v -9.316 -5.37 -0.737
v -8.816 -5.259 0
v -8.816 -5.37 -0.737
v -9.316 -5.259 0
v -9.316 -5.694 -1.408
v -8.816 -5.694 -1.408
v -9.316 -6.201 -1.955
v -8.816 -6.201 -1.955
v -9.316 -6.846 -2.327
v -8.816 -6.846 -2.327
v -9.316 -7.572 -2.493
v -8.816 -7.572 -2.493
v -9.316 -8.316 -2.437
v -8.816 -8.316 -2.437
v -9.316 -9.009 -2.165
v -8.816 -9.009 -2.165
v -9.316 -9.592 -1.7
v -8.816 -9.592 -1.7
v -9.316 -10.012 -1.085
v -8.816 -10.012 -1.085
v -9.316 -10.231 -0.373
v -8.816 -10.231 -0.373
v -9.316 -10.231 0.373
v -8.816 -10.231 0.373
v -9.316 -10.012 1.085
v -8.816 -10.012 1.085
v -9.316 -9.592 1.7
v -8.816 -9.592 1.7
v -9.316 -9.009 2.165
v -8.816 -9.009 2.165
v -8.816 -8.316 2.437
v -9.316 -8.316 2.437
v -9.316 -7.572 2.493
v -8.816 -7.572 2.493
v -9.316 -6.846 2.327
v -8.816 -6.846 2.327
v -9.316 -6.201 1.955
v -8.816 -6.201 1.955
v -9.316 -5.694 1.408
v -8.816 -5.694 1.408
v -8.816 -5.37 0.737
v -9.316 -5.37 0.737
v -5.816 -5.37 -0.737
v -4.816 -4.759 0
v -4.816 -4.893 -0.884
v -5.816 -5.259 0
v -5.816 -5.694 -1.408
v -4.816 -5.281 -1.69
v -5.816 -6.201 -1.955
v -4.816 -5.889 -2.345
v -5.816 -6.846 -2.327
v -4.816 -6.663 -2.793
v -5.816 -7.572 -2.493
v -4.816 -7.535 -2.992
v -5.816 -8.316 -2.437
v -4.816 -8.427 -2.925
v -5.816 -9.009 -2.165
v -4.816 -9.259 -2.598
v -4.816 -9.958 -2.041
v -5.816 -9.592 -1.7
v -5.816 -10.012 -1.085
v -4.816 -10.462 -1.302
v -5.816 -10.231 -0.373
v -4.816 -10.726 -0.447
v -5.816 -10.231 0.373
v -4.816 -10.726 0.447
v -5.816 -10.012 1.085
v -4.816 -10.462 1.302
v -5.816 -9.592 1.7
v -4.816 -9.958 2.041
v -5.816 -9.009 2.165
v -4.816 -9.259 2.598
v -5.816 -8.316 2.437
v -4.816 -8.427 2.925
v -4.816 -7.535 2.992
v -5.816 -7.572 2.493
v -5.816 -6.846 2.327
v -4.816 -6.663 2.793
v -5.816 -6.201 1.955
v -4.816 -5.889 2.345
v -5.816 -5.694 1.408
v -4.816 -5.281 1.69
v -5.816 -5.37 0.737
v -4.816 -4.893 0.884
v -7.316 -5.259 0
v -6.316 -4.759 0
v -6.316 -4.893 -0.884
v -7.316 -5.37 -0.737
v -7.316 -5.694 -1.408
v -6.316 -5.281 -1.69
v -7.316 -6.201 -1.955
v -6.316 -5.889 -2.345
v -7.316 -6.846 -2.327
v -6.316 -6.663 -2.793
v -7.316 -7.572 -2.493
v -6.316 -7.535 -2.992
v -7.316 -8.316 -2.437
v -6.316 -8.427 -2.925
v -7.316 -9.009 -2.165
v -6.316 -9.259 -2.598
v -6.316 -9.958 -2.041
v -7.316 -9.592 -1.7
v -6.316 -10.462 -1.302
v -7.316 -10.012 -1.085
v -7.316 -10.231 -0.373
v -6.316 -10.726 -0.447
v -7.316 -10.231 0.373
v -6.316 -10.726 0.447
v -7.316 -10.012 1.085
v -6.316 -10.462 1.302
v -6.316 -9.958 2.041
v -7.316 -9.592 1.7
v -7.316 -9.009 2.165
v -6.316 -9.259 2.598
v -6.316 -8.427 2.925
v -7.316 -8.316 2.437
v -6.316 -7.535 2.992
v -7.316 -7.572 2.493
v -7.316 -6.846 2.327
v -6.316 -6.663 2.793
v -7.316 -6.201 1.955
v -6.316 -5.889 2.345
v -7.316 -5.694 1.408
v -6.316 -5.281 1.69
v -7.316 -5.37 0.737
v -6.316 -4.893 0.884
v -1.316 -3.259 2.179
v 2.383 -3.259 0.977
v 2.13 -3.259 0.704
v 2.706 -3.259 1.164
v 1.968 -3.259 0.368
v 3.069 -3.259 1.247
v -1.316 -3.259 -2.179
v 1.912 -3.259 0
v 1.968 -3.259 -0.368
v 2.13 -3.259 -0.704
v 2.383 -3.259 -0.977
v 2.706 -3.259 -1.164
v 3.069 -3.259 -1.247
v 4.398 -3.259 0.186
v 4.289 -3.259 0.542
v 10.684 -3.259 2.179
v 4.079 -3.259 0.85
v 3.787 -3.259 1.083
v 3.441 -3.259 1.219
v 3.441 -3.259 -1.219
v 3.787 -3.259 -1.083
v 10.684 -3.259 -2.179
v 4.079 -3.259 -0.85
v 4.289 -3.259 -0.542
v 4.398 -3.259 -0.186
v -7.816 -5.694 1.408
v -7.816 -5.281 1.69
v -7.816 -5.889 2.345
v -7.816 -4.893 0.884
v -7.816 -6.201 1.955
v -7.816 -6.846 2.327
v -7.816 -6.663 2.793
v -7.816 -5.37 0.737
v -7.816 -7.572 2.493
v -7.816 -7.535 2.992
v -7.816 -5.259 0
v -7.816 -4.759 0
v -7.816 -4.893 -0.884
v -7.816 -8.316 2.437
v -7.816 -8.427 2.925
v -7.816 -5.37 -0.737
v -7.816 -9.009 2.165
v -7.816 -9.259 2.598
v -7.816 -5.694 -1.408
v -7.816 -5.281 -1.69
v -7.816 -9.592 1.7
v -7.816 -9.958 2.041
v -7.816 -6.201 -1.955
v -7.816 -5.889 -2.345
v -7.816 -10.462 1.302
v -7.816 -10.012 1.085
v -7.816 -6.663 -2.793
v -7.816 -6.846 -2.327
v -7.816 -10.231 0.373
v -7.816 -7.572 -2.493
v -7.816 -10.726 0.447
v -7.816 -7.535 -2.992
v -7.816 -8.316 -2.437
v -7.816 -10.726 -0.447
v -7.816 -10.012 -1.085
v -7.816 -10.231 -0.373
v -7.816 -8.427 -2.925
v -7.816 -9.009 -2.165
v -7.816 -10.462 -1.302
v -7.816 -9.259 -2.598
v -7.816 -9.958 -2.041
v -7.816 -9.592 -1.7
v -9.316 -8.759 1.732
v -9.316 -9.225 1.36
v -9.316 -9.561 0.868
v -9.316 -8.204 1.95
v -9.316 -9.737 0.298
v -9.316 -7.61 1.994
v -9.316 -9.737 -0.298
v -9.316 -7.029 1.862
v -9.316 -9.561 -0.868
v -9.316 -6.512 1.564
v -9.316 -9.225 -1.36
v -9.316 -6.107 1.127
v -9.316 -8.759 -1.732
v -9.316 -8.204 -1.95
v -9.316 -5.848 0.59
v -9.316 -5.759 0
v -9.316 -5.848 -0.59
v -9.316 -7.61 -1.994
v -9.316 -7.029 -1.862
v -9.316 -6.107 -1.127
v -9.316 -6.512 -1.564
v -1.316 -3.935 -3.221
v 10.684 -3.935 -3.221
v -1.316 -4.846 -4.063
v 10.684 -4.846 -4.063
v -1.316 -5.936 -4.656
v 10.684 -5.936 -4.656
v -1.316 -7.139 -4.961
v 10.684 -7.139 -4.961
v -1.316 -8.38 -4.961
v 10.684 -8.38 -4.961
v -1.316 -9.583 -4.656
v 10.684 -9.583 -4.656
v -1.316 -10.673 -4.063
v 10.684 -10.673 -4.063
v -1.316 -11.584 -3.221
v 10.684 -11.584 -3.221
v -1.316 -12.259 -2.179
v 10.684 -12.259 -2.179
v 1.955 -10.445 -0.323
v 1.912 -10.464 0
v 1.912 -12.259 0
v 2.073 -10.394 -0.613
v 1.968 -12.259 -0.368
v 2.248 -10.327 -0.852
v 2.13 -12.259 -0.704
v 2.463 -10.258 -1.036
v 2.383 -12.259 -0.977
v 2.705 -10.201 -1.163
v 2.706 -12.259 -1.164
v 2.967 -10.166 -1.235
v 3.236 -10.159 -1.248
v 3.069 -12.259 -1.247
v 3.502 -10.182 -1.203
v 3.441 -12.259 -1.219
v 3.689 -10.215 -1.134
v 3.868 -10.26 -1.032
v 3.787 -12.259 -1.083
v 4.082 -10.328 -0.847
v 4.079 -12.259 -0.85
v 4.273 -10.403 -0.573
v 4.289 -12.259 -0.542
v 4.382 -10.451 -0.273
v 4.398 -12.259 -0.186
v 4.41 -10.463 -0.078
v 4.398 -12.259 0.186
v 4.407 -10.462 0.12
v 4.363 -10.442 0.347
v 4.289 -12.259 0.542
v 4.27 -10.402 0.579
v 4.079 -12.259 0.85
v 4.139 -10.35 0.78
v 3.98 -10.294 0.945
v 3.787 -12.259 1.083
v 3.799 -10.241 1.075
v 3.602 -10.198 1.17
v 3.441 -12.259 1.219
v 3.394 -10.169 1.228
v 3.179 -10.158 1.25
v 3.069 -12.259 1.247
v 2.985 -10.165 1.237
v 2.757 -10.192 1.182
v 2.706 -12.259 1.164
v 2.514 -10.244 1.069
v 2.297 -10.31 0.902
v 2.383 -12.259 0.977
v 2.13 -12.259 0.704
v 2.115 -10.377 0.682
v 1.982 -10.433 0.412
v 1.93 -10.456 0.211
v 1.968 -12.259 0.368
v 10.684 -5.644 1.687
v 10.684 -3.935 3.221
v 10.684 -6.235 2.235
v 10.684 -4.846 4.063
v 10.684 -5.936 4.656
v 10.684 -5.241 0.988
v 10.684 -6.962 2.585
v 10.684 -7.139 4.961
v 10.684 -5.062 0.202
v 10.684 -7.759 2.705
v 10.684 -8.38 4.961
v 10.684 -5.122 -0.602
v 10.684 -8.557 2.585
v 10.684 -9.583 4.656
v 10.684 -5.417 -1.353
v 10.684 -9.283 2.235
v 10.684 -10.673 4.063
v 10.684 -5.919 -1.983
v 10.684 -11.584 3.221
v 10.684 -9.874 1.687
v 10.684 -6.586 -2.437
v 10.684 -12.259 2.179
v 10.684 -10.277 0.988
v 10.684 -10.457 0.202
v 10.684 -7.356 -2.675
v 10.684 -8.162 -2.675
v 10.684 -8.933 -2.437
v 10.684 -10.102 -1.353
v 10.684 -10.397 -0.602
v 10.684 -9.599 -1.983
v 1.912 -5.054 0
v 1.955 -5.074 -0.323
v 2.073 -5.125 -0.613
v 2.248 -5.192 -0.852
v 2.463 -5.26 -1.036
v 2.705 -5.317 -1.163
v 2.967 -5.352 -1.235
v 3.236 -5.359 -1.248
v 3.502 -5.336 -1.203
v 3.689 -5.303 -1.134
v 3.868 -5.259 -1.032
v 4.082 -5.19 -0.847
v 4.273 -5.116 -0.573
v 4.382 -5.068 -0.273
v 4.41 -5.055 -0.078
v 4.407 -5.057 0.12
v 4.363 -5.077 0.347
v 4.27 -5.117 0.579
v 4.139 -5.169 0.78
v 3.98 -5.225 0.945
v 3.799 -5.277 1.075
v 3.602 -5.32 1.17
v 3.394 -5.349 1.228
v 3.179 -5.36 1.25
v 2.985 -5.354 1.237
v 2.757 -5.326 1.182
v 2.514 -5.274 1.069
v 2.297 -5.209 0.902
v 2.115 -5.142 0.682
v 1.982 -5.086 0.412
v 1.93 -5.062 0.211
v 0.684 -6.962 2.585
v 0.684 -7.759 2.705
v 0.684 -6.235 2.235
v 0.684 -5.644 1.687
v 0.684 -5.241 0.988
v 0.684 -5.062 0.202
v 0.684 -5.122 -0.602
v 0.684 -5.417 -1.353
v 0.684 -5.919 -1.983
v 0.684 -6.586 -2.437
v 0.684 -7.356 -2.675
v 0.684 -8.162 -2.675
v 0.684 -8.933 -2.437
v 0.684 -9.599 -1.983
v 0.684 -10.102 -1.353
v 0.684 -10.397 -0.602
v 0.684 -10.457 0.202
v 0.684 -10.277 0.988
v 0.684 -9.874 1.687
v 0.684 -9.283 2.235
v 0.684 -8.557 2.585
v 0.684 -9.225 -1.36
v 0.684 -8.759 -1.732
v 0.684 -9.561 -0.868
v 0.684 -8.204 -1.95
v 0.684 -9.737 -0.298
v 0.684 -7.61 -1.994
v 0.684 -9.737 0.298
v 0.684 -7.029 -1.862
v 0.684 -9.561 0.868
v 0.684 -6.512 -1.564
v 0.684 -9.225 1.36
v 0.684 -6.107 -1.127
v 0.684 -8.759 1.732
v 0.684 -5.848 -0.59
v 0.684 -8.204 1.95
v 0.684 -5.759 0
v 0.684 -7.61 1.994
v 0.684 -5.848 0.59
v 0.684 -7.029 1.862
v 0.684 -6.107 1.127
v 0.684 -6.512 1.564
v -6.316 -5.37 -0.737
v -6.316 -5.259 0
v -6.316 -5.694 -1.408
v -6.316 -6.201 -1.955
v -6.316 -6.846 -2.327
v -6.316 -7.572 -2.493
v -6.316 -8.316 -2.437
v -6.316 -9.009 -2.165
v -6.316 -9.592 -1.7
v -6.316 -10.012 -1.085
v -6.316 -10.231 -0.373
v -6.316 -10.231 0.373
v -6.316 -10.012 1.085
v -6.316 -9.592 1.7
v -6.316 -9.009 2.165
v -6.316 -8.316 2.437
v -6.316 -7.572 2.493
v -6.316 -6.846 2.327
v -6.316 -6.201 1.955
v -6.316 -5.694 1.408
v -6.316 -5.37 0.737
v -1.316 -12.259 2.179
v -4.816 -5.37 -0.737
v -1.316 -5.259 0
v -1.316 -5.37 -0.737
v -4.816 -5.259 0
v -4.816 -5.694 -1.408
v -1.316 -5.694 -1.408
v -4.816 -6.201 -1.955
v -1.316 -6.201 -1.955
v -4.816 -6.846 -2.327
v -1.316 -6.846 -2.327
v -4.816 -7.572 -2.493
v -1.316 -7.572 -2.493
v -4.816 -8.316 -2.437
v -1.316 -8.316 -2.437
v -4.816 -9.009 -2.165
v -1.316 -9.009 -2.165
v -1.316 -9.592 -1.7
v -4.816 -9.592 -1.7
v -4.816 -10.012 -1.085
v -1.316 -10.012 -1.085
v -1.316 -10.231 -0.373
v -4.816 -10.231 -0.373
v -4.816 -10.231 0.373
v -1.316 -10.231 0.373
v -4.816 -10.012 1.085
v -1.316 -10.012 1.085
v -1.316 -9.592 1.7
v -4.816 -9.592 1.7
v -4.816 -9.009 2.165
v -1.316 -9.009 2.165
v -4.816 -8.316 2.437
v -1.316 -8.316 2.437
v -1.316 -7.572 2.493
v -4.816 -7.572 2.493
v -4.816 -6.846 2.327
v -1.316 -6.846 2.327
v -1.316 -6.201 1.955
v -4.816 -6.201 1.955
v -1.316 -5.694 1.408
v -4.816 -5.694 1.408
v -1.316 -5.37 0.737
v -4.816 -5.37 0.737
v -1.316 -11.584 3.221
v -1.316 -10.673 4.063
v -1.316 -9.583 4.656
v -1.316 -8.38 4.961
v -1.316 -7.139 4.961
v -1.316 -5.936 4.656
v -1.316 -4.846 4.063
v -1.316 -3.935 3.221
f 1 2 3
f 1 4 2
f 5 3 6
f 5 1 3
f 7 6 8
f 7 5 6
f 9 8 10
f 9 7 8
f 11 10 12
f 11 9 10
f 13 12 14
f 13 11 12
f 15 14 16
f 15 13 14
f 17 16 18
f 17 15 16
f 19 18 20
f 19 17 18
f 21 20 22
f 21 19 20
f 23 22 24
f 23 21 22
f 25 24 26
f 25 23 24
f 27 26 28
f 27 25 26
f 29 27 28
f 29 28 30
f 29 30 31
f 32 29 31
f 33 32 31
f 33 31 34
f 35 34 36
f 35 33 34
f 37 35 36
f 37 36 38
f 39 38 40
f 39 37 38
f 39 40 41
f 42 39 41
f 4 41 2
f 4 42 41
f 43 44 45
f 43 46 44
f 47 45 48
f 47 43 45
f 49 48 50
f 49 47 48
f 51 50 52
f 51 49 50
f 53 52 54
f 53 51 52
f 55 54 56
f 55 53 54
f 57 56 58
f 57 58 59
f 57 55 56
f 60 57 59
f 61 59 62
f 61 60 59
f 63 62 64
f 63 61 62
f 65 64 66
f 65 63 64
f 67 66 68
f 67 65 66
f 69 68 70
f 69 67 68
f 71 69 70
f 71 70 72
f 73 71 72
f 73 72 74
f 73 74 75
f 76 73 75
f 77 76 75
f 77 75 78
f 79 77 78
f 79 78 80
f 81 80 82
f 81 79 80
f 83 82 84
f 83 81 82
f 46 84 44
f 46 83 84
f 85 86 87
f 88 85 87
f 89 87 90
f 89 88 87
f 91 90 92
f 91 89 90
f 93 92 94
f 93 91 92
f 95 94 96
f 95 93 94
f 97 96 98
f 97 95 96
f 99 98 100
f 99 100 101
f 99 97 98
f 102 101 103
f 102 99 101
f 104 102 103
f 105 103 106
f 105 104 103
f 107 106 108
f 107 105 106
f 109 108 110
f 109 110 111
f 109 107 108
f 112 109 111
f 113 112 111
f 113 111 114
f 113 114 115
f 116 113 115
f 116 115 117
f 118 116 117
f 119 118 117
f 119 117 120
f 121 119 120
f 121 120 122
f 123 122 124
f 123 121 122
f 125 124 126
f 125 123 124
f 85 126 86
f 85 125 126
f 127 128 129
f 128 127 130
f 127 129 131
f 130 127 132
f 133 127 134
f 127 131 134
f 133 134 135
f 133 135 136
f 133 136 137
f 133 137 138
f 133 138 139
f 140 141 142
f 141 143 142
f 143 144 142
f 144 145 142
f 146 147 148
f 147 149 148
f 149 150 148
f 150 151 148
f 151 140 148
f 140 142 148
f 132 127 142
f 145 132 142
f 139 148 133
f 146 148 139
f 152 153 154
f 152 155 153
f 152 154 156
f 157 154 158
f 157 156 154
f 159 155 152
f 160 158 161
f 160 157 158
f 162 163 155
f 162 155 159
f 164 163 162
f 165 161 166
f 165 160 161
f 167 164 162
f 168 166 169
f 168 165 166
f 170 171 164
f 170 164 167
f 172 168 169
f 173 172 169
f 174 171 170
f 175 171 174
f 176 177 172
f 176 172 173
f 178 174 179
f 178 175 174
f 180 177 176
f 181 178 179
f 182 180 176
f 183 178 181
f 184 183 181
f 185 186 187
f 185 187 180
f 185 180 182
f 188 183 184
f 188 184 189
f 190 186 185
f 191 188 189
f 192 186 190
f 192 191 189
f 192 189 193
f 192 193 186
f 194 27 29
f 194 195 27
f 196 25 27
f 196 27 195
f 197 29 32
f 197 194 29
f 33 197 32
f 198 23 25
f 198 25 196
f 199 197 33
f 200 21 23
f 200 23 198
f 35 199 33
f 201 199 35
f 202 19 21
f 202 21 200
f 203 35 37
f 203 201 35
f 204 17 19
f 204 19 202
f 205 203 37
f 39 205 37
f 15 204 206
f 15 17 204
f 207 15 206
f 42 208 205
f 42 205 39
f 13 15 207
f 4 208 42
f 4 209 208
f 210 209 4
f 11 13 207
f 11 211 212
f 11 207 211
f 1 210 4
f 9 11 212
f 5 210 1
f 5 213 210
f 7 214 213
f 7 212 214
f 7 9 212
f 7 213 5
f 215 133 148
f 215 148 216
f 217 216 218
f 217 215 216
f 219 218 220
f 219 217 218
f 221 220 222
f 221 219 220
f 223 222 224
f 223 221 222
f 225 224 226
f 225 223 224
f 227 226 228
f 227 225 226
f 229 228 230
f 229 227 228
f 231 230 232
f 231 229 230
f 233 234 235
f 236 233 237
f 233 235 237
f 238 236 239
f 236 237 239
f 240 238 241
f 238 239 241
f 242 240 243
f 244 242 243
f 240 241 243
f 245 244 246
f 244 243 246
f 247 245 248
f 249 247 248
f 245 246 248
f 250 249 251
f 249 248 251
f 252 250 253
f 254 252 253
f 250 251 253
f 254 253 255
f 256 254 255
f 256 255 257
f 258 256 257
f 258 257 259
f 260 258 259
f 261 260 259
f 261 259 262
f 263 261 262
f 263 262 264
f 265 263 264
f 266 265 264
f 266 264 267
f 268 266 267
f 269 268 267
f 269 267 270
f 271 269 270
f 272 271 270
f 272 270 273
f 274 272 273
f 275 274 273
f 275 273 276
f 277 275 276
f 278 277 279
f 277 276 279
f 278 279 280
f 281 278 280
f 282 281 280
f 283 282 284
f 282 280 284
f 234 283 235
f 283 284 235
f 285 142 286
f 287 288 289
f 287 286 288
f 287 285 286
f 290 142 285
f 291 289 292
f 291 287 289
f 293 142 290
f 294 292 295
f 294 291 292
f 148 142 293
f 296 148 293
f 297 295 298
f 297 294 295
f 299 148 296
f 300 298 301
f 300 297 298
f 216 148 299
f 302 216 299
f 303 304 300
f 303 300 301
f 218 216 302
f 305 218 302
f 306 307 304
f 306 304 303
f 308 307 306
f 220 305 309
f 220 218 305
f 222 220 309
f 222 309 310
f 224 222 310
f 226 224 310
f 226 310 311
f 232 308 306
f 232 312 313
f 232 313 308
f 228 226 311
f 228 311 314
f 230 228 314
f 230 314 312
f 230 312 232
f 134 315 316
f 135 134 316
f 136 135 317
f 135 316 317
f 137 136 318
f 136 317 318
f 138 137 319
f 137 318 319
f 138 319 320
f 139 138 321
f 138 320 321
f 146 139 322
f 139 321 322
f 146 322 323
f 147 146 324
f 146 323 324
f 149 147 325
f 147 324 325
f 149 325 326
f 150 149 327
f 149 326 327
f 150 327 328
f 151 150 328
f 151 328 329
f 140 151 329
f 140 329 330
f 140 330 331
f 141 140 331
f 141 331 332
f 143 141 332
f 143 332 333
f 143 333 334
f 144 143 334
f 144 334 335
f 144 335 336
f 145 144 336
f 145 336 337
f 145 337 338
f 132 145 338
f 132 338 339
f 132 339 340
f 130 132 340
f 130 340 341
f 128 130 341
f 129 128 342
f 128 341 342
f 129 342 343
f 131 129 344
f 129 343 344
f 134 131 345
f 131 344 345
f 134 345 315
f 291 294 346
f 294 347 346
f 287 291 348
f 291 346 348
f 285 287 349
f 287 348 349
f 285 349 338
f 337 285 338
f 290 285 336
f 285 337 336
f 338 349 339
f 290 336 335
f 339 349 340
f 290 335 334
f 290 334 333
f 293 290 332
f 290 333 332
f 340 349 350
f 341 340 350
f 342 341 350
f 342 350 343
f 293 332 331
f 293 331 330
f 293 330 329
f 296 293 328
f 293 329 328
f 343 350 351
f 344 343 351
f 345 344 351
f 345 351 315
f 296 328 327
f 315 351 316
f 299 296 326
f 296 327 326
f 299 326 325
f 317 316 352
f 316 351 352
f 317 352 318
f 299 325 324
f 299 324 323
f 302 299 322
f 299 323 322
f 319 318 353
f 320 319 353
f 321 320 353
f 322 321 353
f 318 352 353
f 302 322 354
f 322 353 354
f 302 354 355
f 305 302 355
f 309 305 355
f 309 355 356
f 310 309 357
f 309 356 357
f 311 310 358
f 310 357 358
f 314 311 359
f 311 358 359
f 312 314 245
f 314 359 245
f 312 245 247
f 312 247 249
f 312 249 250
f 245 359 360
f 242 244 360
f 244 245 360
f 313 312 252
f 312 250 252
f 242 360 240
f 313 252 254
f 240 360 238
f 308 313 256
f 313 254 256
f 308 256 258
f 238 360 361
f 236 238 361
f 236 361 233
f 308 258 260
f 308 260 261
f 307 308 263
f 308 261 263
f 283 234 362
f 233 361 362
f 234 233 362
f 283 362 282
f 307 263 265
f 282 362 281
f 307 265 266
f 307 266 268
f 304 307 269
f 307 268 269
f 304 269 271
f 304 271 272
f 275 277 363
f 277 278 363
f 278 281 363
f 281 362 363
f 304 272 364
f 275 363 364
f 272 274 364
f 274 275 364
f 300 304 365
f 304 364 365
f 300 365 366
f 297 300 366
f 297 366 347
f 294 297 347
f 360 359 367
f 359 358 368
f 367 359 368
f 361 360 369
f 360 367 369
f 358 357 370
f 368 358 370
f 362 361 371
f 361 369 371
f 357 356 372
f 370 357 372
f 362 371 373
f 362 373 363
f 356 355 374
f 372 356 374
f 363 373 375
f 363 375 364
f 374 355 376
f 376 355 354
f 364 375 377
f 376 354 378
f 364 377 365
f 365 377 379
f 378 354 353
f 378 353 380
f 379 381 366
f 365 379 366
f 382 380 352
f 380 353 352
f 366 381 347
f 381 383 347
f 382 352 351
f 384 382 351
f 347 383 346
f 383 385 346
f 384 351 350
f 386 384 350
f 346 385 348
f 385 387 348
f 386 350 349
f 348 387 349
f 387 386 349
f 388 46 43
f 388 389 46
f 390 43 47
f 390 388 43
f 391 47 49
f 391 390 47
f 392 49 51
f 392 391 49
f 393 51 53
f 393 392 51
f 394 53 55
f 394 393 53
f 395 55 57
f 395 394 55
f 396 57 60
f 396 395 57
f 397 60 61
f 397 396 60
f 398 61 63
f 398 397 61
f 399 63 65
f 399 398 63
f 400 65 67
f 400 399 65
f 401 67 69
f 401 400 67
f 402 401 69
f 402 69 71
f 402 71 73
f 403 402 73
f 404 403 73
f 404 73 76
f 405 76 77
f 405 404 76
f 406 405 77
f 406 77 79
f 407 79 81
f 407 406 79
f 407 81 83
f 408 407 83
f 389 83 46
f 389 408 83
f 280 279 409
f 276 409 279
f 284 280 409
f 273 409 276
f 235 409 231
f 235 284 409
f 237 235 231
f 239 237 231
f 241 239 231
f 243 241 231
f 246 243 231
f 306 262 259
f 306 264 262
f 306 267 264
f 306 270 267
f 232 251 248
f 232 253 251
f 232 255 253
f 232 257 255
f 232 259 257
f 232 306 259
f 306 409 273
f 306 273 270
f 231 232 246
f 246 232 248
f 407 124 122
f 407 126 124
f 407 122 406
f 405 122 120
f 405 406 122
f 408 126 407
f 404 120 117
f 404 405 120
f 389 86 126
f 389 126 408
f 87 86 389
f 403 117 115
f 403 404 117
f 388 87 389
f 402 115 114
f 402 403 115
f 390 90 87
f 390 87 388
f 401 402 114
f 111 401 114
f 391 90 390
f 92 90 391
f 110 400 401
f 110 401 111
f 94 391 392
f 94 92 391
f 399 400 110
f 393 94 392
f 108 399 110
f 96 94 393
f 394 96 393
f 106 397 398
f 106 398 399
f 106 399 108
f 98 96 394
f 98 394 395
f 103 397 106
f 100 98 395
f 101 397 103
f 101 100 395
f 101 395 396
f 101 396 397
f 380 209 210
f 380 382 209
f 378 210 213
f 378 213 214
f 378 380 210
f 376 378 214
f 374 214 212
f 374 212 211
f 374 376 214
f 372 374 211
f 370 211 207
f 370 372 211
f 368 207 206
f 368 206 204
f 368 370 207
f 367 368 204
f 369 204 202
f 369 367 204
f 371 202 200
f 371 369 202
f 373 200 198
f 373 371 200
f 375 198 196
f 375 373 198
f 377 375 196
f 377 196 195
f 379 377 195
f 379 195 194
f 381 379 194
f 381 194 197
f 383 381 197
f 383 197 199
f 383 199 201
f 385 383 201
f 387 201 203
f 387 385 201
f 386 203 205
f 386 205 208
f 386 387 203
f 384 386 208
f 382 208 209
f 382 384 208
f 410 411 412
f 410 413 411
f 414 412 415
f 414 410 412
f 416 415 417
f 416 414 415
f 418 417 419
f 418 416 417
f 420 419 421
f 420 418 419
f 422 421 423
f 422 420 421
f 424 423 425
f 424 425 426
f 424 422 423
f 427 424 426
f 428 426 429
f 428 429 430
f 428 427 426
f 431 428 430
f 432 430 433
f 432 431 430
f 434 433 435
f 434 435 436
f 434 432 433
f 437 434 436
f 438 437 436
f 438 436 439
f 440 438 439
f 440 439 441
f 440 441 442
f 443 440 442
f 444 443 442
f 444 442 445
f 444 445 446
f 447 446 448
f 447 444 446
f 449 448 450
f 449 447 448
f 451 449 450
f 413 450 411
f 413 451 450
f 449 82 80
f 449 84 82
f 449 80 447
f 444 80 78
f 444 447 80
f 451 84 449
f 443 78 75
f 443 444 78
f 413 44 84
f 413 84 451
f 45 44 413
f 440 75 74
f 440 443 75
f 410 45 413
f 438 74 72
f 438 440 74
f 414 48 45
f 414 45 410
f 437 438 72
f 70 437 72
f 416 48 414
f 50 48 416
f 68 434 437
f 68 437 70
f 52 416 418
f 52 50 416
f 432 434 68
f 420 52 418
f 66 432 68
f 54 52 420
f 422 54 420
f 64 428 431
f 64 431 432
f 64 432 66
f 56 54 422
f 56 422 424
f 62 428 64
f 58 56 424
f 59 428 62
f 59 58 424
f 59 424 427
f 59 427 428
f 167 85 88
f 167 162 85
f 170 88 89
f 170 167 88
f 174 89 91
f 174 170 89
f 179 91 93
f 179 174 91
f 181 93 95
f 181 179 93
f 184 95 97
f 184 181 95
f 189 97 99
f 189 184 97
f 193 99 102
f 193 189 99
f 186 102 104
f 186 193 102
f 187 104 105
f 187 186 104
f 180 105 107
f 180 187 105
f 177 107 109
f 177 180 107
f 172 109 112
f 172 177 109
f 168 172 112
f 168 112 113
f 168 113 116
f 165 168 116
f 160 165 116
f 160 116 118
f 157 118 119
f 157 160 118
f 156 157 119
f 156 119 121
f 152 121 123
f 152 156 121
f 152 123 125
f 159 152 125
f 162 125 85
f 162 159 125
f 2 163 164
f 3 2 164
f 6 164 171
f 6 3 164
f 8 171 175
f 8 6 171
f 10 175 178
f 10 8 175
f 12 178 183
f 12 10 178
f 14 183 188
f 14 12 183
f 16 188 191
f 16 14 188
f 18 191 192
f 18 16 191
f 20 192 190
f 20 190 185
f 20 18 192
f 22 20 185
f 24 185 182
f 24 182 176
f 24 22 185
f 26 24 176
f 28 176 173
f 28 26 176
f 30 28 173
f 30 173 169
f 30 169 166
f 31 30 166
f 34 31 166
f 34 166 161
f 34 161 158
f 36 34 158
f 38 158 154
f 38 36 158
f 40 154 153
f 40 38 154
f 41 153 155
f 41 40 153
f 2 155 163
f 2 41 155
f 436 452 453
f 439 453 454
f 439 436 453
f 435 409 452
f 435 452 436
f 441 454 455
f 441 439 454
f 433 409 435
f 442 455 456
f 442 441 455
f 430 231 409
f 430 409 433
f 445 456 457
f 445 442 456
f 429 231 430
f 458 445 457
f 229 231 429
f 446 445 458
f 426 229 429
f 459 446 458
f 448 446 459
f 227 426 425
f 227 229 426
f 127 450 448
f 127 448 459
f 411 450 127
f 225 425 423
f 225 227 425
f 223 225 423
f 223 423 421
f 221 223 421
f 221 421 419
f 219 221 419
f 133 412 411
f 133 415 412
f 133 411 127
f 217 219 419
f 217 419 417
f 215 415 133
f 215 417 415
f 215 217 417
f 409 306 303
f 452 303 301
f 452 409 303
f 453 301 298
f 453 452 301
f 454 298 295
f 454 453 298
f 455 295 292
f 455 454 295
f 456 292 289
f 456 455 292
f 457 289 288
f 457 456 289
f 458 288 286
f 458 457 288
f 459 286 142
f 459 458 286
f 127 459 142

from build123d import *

# Parameters (mm, degrees)
SKETCH4_OUTSIDE_W           = 16.898
SKETCH4_OUTSIDE_H           = 16.898
SKETCH4_OUTSIDE_W_2         = 32
SKETCH4_OUTSIDE_H_2         = 9
CUT_EXTRUDE1_DEPTH          = 21
F_1_4_28_TAPPED_HOLE2_D     = 5.4102
F_1_4_28_TAPPED_HOLE2_DEPTH = 10
M3_TAPPED_HOLE1_D           = 2.5


with BuildPart() as part:
    # Sketch1 → Revolve1 (revolve)
    with BuildSketch(Plane.XY):
        Polygon((-1.315886695, -5.259279322), (-4.815886695, -5.259279322), (-4.815886695, -4.759279322), (-5.815886695, -5.259279322), (-6.315886695, -5.259279322), (-6.315886695, -4.759279322), (-7.315886695, -5.259279322), (-7.815886695, -5.259279322), (-7.815886695, -4.759279322), (-8.815886695, -5.259279322), (-9.315886695, -5.259279322), (-9.315886695, -5.759279322), (0.684113305, -5.759279322), (0.684113305, -7.759279322), (10.684113305, -7.759279322), (10.684113305, -2.759279322), (-1.315886695, -2.759279322), align=None)
    revolve(axis=Axis((2.271553965, -7.759279322, 0), (-1, 0, 0)))

    # Sketch4 outside → Cut-Extrude1 (cut, through all)
    with BuildSketch(Plane(origin=(10.684113305, 0, 0), x_dir=(0, 0, -1), z_dir=(1, 0, 0))):
        with Locations((0, -7.759)):
            Rectangle(SKETCH4_OUTSIDE_W, SKETCH4_OUTSIDE_H)
        with Locations((0, -7.759279322)):
            Rectangle(SKETCH4_OUTSIDE_W_2, SKETCH4_OUTSIDE_H_2, mode=Mode.SUBTRACT)
    extrude(amount=-CUT_EXTRUDE1_DEPTH, mode=Mode.SUBTRACT)

    # 1/4-28 Tapped Hole2
    with Locations(Plane(origin=(10.684113305, 0, 0), x_dir=(0, 0, -1), z_dir=(1, 0, 0))):
        with Locations((0, -7.759279322)):
            Hole(F_1_4_28_TAPPED_HOLE2_D / 2, depth=F_1_4_28_TAPPED_HOLE2_DEPTH)

    # M3 Tapped Hole1 (through all)
    with Locations(Plane(origin=(0, -3.259279322, 0), x_dir=(1, 0, 0), z_dir=(0, 1, 0))):
        with Locations((3.162442737, 0)):
            Hole(M3_TAPPED_HOLE1_D / 2)


solid = part.part
